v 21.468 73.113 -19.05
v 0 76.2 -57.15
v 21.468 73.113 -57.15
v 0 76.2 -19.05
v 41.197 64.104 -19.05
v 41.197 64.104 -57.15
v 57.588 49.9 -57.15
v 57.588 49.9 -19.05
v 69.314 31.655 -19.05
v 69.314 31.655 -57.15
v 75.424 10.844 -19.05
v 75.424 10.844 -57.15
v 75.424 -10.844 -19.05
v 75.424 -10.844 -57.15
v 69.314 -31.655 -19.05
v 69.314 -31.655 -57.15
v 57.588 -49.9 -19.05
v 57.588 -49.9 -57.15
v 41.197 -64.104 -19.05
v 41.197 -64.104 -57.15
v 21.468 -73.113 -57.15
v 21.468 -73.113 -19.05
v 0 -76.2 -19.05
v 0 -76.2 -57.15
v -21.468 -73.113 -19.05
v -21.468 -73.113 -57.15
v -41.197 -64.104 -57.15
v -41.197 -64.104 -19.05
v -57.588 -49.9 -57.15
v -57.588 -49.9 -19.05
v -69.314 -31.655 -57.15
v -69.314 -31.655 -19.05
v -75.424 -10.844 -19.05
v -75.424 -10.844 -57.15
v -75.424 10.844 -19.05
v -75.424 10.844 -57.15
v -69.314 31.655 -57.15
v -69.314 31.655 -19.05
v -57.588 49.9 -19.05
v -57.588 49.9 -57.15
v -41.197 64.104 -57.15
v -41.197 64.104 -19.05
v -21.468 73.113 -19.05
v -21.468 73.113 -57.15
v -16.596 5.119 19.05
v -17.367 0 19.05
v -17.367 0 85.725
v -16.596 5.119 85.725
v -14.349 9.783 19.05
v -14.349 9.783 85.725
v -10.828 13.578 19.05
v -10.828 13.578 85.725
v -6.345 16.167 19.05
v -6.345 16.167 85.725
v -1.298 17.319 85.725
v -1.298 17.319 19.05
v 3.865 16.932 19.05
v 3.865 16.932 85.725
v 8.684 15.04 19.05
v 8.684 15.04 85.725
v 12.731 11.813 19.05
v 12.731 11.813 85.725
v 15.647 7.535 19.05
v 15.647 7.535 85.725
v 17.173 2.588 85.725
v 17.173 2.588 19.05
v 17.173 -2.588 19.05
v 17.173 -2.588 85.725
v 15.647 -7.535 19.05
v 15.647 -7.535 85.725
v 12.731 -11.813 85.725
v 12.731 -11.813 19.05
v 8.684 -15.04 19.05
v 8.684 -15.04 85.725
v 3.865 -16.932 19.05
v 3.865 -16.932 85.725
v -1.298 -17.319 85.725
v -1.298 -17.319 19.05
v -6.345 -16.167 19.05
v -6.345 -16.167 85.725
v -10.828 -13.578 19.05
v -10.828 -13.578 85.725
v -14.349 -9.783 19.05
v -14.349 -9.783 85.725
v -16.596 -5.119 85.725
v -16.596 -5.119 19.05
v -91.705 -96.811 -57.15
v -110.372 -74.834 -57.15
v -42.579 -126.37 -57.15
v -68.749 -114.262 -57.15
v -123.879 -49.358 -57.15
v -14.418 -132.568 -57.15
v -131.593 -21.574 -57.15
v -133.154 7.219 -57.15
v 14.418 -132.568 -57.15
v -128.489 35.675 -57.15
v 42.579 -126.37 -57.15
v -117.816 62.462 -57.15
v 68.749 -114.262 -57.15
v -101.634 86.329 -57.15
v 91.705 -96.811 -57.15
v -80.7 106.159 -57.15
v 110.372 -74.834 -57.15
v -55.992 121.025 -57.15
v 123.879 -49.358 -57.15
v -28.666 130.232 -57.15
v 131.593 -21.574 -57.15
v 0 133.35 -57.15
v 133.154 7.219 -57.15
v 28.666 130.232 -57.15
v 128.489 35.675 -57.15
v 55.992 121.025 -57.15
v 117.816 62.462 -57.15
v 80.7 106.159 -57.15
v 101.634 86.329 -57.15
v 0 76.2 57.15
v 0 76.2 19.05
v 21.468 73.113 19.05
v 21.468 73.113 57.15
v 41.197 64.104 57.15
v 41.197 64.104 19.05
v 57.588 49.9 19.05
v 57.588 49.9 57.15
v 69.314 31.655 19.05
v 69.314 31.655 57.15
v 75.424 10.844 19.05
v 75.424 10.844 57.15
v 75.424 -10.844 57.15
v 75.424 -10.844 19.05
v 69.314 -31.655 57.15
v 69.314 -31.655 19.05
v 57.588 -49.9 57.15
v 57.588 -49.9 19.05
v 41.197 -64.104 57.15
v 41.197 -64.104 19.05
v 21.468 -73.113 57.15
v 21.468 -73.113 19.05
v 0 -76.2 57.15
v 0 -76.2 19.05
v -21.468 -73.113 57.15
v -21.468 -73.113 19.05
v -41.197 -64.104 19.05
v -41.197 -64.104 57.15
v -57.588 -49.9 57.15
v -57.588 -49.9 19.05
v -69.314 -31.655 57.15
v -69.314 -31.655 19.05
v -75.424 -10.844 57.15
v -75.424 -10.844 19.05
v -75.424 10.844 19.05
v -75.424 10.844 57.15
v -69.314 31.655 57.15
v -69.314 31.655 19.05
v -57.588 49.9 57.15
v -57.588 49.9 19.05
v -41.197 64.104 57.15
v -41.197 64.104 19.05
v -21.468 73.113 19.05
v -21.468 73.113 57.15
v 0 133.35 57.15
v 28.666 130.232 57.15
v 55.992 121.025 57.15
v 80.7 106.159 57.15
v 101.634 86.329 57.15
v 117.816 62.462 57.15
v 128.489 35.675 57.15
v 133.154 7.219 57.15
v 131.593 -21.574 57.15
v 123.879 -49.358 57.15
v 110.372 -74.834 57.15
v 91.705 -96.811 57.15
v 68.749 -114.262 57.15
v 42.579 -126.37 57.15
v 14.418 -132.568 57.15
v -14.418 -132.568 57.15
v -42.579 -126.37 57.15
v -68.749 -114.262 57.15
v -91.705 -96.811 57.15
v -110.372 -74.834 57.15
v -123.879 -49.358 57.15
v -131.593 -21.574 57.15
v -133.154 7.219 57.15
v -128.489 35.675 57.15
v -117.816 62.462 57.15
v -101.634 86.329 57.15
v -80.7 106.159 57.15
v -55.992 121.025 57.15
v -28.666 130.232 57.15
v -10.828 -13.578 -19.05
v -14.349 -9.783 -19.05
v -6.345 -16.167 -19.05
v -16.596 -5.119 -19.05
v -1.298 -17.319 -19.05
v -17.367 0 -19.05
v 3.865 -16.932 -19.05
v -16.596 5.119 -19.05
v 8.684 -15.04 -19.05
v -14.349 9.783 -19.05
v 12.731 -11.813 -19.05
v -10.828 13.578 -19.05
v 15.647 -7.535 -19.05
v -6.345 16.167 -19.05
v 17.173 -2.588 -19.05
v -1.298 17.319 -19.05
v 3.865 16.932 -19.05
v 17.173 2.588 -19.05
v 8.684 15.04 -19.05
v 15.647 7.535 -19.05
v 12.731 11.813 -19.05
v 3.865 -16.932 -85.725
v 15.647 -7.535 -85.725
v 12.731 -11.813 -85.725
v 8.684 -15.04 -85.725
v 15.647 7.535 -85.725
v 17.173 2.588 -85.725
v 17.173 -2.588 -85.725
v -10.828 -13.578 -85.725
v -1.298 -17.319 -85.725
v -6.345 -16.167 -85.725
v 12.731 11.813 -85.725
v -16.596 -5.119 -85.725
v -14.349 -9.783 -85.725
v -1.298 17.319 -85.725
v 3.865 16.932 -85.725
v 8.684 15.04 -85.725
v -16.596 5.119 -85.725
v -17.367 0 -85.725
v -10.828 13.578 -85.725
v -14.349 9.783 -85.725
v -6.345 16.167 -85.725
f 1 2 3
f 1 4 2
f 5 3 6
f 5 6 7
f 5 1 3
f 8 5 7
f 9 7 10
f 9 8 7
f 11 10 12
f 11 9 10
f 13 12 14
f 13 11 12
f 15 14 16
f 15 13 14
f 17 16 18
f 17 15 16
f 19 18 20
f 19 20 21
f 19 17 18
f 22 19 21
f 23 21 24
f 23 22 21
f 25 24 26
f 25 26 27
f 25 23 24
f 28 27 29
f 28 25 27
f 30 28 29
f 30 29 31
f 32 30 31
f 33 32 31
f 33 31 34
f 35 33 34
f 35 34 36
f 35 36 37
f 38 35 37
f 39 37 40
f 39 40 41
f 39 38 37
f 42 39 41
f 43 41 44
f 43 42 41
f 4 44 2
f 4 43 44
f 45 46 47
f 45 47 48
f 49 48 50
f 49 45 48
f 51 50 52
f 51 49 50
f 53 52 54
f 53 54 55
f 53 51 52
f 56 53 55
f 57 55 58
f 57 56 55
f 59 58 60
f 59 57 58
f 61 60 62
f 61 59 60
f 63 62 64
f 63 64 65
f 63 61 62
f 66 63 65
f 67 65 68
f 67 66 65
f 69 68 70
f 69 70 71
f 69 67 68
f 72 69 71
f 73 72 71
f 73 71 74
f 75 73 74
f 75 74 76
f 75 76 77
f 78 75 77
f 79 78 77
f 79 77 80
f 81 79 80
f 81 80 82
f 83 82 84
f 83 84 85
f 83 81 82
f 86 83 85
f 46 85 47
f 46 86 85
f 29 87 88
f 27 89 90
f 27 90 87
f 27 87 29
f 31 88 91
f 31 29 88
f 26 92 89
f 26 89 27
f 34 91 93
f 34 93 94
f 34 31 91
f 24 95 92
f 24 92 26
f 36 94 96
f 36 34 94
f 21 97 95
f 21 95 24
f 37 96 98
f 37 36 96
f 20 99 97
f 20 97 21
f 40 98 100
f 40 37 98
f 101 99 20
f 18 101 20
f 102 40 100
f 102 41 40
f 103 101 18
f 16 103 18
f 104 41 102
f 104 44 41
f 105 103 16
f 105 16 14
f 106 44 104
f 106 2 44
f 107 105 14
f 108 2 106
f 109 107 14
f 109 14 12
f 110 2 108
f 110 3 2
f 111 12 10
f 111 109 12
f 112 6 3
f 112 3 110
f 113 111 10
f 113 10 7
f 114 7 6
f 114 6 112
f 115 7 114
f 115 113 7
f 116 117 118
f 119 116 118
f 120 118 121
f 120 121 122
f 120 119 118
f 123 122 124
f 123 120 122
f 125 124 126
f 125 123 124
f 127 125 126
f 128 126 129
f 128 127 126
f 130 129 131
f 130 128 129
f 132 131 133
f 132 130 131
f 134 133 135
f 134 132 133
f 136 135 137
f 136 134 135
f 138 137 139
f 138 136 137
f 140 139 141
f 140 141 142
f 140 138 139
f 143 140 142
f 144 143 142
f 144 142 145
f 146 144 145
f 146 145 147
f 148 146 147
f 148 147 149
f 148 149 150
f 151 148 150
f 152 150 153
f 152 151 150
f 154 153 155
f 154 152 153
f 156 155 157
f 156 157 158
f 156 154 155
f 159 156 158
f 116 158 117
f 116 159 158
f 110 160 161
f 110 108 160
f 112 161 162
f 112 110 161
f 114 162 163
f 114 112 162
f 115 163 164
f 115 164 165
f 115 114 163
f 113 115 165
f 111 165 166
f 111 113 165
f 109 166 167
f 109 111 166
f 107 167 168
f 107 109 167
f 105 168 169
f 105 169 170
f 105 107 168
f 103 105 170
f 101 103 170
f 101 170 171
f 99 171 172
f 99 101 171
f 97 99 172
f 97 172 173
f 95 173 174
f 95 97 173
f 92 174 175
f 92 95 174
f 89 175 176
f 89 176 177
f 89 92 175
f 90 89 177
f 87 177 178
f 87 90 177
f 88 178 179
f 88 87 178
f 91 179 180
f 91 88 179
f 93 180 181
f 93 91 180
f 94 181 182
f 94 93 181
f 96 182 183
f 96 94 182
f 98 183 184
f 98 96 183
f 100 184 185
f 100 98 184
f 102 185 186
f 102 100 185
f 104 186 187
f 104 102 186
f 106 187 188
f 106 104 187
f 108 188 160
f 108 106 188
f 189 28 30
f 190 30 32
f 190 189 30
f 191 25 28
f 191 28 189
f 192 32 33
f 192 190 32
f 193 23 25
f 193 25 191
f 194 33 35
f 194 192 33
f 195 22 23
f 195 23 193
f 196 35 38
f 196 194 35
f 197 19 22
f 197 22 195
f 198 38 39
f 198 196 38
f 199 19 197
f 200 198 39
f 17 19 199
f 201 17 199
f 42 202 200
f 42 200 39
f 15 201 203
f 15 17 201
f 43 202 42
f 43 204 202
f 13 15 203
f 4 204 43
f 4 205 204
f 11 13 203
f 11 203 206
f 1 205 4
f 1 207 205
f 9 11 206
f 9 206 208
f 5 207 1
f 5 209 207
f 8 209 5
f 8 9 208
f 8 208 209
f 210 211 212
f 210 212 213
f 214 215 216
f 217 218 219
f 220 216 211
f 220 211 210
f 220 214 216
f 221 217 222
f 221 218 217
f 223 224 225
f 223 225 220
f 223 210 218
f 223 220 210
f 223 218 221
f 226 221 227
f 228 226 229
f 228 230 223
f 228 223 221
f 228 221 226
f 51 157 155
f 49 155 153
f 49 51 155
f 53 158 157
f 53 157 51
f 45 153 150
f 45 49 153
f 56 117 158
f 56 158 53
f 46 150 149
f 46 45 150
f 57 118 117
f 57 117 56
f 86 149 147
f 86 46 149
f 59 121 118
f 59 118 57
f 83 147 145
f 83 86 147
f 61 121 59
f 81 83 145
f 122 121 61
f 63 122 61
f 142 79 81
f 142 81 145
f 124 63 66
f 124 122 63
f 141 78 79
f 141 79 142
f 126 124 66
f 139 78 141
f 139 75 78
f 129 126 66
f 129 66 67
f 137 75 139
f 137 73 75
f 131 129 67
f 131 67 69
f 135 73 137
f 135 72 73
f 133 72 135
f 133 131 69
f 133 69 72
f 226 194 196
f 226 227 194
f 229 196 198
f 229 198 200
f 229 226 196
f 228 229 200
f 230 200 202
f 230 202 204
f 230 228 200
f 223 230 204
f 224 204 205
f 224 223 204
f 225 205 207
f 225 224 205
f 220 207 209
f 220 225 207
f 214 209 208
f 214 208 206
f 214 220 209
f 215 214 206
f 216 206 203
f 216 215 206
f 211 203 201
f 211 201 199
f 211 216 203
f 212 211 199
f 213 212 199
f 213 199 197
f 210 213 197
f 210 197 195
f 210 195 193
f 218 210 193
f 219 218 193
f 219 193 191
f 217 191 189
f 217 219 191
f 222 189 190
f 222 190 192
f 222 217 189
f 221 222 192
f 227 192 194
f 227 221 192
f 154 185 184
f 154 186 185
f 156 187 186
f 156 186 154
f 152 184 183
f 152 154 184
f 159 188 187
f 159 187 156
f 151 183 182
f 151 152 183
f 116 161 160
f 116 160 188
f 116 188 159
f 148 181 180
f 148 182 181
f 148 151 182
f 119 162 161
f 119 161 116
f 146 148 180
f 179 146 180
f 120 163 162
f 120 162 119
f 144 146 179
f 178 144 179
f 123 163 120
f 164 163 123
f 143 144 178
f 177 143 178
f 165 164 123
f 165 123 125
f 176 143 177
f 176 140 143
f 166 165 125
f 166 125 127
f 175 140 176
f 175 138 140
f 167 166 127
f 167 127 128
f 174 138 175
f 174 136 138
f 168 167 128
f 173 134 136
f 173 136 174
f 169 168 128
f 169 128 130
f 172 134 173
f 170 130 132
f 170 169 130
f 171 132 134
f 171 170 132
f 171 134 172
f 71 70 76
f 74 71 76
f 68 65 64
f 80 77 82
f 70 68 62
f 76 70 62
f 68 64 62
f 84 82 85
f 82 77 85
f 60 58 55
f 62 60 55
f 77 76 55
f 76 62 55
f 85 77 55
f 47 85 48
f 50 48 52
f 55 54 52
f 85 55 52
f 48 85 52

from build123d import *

# Parameters (mm, degrees)
SKETCH4_R           = 17.36725
BOSS_EXTRUDE1_DEPTH = 85.725


with BuildPart() as part:
    # Sketch1 → Revolve1 (revolve)
    with BuildSketch(Plane(origin=(0, 0, 0), x_dir=(0, 0, -1), z_dir=(1, 0, 0))):
        Polygon((-57.15, 76.2), (-57.15, 133.35), (57.15, 133.35), (57.15, 76.2), (19.05, 76.2), (19.05, 0), (-19.05, 0), (-19.05, 76.2), align=None)
    revolve(axis=Axis((0, 0, 19.05), (0, 0, -1)))

    # Sketch4 → Boss-Extrude1 (add, symmetric)
    with BuildSketch(Plane(origin=(0, 0, 0), x_dir=(-1, 0, 0), z_dir=(0, 0, -1))):
        Circle(SKETCH4_R)
    extrude(amount=BOSS_EXTRUDE1_DEPTH, both=True)


solid = part.part
